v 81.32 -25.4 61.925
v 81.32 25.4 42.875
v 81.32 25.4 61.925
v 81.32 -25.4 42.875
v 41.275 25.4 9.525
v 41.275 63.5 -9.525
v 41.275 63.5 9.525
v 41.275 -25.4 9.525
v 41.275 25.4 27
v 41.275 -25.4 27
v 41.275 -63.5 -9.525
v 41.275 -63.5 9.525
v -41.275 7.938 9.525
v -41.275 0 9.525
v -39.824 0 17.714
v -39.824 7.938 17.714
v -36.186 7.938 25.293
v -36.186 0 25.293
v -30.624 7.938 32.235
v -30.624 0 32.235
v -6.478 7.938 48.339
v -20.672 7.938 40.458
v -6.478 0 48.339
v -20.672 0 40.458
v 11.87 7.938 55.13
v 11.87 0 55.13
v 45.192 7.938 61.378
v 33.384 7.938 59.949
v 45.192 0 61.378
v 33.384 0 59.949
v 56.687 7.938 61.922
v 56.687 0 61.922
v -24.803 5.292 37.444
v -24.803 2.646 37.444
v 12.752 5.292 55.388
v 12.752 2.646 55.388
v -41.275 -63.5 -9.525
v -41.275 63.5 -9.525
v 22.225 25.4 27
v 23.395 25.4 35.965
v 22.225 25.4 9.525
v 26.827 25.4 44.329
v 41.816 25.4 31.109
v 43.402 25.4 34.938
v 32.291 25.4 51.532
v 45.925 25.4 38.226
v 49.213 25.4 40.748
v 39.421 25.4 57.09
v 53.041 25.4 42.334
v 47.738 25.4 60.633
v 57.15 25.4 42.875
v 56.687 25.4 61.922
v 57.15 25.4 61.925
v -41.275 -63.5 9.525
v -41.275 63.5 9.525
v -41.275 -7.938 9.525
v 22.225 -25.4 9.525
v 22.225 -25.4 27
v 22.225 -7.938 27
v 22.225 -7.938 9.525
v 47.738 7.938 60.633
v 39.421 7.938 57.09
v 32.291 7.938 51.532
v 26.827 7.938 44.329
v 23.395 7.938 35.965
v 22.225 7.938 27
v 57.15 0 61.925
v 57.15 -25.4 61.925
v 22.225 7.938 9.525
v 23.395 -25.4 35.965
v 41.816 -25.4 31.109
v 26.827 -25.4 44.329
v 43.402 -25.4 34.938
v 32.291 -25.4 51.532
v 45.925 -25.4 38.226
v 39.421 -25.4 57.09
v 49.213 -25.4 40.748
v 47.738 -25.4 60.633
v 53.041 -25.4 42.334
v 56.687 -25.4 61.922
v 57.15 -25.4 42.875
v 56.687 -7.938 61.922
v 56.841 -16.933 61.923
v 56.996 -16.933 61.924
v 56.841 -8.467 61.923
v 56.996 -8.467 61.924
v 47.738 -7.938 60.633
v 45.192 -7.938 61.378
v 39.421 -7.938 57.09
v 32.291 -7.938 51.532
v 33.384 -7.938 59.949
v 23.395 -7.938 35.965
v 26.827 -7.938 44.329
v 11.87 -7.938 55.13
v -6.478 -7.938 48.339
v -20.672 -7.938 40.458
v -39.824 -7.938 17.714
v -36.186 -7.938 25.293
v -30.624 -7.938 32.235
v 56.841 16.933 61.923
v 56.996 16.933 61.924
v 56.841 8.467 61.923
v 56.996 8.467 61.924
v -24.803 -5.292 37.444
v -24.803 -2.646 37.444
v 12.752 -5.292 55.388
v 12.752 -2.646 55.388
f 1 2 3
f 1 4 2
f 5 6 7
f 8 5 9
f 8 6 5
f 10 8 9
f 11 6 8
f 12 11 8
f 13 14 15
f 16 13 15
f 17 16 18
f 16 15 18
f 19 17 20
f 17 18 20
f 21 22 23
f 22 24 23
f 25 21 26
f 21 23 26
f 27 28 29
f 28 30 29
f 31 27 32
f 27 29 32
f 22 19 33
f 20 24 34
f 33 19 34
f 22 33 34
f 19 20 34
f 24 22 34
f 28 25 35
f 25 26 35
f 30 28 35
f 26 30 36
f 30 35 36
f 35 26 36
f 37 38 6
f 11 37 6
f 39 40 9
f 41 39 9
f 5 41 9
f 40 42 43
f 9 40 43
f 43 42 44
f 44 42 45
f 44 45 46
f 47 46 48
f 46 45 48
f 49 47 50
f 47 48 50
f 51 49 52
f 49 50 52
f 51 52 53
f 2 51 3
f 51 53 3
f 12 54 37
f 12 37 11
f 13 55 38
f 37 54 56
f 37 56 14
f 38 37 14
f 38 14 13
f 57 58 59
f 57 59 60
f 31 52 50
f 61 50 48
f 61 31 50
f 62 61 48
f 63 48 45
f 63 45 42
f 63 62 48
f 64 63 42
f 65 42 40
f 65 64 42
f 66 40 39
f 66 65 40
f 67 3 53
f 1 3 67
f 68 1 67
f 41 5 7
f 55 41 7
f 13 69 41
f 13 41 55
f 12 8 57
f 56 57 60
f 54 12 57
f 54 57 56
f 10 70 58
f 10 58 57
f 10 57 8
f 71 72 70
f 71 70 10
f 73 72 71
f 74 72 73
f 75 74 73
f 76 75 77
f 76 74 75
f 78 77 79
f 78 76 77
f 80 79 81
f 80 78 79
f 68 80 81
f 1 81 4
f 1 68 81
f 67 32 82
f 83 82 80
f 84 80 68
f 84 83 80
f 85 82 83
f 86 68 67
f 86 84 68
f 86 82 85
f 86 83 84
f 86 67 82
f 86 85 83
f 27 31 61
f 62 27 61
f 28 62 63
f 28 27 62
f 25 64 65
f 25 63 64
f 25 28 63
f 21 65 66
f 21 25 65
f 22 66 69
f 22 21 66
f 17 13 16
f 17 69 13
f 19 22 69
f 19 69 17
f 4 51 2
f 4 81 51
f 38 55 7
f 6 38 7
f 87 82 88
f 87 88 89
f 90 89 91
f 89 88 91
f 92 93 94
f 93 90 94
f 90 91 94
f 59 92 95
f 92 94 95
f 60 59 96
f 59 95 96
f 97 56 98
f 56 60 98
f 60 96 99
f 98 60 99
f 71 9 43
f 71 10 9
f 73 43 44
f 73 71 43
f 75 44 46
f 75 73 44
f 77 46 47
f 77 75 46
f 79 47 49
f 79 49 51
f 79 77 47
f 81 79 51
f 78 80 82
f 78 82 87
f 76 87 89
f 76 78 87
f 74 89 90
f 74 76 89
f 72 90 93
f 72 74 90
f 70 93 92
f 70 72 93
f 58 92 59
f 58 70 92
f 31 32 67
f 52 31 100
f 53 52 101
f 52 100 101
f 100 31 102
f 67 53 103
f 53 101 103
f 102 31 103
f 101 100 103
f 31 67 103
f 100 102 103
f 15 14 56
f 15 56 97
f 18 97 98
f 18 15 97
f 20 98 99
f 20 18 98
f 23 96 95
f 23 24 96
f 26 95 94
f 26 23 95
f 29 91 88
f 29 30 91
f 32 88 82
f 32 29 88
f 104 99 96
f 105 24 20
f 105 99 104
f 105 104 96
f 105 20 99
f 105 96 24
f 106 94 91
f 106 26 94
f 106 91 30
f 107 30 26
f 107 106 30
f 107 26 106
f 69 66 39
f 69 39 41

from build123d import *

# Parameters (mm, degrees)
F1_DEPTH = 63.5
F2_DEPTH = 7.9375
F0_W     = 20.994958
F0_H     = 19.05
F3_DEPTH = 25.4


with BuildPart() as f1:
    # F0 (on Front) → F1 (new body, symmetric)
    with BuildSketch(Plane.XZ):
        Polygon((22.225, 9.525), (-41.275, 9.525), (-41.275, -9.525), (41.275, -9.525), (41.275, 9.525), align=None)
    extrude(amount=F1_DEPTH, both=True)

    # F0 (on Front) → F2 (join, symmetric)
    with BuildSketch(Plane.XZ):
        with BuildLine():
            add(Edge.make_bspline(
                [(-41.275, 9.525), (-40.245121, 41.951919), (14.464107, 61.571726), (56.686629, 61.922126)],
                knots=[0, 0, 0, 0, 111.097679, 111.097679, 111.097679, 111.097679], degree=3))
            Line((-41.275, 9.525), (22.225, 9.525))
            Line((22.225, 9.525), (22.225, 27.0002))
            ThreePointArc((22.225, 27.0002), (32.291009, 51.531531), (56.686629, 61.922126))
        make_face()
    extrude(amount=F2_DEPTH, both=True)

    # F0 (on Front) → F3 (join, symmetric)
    with BuildSketch(Plane.XZ):
        with Locations((70.822479, 52.4002)):
            Rectangle(F0_W, F0_H)
        with BuildLine():
            Line((22.225, 27.0002), (22.225, 9.525))
            Line((22.225, 9.525), (41.275, 9.525))
            Line((41.275, 9.525), (41.275, 27.0002))
            ThreePointArc((41.275, 27.0002), (45.92468, 38.22552), (57.15, 42.8752))
            Line((57.15, 42.8752), (60.325, 42.8752))
            Line((60.325, 42.8752), (60.325, 61.9252))
            Line((60.325, 61.9252), (57.15, 61.9252))
            add(Edge.make_bspline(
                [(56.686629, 61.922126), (56.841254, 61.923409), (56.995713, 61.924434), (57.15, 61.9252)],
                knots=[111.097679, 111.097679, 111.097679, 111.097679, 111.504536, 111.504536, 111.504536, 111.504536], degree=3))
            ThreePointArc((56.686629, 61.922126), (32.291009, 51.531531), (22.225, 27.0002))
        make_face()
    extrude(amount=F3_DEPTH, both=True)


solid = f1.part
